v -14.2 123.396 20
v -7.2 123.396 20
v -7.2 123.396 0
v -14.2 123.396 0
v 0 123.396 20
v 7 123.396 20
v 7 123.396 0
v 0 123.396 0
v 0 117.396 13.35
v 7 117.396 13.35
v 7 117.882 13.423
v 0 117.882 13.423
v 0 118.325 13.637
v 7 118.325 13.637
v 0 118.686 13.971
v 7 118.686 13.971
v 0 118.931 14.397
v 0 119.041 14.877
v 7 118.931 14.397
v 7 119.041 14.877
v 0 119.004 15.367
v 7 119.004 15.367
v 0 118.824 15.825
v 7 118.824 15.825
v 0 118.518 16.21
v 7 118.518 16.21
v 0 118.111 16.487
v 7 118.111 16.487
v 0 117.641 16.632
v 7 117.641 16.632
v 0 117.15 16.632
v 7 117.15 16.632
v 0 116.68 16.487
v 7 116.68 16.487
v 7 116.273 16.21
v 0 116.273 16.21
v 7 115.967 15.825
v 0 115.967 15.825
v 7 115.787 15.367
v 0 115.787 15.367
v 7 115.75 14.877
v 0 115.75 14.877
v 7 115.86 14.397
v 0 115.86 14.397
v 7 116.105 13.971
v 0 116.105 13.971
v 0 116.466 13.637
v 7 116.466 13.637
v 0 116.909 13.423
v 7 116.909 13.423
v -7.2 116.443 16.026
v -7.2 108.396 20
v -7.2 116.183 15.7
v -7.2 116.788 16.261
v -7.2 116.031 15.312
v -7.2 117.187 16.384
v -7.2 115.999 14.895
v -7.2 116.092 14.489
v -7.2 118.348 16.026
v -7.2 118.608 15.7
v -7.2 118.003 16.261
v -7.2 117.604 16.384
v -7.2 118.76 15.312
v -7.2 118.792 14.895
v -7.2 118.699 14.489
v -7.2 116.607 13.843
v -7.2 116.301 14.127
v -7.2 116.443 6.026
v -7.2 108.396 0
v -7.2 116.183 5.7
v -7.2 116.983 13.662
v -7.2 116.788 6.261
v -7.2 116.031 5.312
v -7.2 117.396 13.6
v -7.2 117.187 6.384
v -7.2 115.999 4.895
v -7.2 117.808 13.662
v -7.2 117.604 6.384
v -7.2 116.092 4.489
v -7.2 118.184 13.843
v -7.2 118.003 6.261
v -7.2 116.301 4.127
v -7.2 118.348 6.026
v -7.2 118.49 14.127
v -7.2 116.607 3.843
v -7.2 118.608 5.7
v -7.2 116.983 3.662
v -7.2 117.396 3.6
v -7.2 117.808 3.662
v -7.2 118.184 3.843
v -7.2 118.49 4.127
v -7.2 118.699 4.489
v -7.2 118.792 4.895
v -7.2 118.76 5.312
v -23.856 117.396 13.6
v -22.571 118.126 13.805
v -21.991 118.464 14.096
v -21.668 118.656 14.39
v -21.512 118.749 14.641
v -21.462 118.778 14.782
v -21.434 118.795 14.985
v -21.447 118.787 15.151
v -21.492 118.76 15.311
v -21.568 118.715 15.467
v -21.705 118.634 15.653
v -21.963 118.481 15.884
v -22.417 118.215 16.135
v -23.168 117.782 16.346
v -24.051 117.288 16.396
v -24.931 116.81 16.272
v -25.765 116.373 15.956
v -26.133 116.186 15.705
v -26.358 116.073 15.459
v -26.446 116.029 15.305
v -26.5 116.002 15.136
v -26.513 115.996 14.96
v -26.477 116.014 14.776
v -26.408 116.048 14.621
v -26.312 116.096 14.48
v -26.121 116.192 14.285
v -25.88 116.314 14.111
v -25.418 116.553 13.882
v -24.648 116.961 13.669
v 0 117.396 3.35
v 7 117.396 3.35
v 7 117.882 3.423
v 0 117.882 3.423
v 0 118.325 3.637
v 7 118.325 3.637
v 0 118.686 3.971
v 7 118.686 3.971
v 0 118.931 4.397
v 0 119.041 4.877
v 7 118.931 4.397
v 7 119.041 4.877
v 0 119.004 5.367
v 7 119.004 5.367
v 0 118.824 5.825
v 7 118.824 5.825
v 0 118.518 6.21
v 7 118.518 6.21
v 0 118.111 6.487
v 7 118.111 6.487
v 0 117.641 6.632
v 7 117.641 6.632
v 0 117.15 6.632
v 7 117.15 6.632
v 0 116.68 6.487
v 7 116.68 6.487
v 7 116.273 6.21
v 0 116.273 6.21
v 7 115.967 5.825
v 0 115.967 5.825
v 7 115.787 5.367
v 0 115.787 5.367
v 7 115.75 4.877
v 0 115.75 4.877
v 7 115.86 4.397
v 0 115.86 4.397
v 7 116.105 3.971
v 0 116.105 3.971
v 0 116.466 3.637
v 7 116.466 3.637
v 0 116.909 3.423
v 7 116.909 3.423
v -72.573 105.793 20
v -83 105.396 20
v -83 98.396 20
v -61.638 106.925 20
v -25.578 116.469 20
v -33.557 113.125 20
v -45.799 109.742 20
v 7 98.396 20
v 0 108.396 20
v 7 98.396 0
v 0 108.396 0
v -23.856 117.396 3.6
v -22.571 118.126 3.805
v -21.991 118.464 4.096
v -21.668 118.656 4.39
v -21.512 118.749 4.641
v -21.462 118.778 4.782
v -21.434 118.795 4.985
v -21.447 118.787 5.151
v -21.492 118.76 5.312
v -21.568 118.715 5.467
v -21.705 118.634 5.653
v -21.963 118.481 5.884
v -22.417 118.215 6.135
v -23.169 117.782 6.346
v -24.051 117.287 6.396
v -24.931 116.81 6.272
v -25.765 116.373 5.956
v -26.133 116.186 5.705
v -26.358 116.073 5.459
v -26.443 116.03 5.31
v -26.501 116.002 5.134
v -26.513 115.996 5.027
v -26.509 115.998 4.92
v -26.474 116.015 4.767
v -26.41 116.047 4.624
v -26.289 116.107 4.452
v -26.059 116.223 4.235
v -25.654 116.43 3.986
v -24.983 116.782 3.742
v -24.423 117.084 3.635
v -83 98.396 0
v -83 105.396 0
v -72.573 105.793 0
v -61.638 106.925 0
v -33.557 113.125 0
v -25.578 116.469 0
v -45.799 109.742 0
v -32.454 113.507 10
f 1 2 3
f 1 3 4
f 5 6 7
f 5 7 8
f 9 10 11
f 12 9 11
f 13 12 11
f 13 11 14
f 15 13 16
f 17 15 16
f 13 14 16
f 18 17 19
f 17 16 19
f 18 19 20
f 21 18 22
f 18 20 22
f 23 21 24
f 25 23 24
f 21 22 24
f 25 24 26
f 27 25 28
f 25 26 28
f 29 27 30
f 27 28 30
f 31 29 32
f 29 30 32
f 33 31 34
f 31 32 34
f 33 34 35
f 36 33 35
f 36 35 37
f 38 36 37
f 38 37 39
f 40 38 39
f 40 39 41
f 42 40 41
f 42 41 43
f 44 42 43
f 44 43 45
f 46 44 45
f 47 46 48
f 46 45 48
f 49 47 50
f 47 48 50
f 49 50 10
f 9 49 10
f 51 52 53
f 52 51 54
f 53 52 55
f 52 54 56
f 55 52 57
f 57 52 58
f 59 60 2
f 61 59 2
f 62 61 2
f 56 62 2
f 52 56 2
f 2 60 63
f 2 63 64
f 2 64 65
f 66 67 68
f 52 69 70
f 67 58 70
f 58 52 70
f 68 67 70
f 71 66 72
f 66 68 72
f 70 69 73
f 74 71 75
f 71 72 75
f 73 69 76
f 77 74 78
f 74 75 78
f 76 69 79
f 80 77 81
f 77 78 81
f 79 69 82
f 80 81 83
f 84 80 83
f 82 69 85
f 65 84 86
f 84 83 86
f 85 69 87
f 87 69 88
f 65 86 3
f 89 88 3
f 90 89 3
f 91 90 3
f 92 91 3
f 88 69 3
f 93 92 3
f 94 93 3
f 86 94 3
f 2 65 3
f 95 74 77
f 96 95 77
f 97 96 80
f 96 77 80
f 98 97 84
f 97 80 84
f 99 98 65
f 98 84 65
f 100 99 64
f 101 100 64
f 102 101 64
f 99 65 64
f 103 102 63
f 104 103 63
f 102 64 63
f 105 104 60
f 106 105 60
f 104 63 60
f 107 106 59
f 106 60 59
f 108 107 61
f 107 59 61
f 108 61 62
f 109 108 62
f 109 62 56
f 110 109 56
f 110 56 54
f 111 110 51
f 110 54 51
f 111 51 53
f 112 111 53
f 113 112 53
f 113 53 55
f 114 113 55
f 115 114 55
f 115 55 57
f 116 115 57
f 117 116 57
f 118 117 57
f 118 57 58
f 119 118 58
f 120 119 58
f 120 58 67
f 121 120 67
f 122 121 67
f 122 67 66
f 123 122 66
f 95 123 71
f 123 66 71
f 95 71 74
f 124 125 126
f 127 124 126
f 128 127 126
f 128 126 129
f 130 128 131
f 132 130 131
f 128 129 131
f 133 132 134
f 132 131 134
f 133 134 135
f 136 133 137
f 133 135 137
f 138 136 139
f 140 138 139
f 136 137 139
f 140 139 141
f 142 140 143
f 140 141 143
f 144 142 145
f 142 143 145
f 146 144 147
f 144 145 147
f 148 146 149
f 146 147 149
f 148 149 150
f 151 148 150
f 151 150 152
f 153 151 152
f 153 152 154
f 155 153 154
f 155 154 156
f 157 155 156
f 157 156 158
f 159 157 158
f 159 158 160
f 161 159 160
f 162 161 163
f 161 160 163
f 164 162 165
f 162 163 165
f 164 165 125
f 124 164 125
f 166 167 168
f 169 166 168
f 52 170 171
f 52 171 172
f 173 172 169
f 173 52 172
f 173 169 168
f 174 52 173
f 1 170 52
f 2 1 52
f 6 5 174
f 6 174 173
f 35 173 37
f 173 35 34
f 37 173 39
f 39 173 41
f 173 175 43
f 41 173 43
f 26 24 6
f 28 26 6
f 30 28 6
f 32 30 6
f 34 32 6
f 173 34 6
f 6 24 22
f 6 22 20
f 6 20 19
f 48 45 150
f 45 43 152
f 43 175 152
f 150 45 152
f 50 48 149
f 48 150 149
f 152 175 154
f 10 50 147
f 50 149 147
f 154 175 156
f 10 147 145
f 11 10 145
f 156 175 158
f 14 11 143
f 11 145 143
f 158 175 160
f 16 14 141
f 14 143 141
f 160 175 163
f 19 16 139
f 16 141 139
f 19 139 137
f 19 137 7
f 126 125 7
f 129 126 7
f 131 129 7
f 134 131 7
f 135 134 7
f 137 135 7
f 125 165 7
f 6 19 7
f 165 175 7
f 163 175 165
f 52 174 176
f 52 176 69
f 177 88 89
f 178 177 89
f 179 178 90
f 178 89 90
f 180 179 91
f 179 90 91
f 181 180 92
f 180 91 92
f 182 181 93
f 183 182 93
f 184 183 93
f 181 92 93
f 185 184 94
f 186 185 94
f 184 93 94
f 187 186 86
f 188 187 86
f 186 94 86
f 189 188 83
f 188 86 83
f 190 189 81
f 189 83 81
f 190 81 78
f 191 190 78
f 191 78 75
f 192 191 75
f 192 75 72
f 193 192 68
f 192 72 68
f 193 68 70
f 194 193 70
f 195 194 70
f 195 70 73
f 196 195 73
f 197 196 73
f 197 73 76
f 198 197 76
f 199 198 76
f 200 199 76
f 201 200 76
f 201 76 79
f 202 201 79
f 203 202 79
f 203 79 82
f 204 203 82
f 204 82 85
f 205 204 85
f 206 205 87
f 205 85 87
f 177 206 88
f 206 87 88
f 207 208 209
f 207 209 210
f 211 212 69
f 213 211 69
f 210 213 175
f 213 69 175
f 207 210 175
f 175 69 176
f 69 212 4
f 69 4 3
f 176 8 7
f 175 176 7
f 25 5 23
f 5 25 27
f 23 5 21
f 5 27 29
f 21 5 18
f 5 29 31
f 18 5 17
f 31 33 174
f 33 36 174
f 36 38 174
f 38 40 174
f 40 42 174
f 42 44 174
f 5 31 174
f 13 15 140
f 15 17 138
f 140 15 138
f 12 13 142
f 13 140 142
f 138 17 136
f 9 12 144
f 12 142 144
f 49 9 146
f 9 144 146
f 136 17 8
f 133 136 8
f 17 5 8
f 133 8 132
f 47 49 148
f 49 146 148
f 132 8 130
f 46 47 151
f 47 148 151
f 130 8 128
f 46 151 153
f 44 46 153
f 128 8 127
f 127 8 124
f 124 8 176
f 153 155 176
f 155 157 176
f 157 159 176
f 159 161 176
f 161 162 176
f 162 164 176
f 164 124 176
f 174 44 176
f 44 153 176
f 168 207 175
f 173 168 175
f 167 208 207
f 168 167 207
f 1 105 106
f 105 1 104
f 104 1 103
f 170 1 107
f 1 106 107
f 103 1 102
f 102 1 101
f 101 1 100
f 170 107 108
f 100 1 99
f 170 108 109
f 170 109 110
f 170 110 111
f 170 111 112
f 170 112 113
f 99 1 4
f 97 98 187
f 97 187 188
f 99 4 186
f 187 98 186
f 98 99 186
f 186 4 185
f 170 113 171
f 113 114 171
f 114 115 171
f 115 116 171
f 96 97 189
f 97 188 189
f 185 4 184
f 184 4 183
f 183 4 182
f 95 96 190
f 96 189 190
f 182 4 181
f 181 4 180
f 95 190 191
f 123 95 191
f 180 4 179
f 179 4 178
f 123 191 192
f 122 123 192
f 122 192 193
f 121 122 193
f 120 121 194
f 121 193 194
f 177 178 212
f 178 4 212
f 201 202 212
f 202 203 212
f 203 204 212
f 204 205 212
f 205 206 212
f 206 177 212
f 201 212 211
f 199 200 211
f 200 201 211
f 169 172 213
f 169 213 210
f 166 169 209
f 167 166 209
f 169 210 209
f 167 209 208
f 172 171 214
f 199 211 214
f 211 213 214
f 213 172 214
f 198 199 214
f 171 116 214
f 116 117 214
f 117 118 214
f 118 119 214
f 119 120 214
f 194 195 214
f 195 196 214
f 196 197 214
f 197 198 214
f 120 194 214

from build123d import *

# Parameters (mm, degrees)
BOSS_EXTRUDE1_DEPTH = 20
SKETCH2_R           = 1.65
CUT_EXTRUDE1_DEPTH  = 7
SKETCH3_R           = 1.4
CUT_EXTRUDE2_DEPTH  = 27


with BuildPart() as part:
    # Sketch1 → Boss-Extrude1 (new body)
    with BuildSketch(Plane.XY):
        with BuildLine():
            Line((0, 123.395512055), (0, 108.395512055))
            Line((0, 108.395512055), (-7.2, 108.395512055))
            Line((-7.2, 108.395512055), (-7.2, 123.395512055))
            Line((-7.2, 123.395512055), (-14.2, 123.395512055))
            add(Edge.make_bspline(
                [(-14.2, 123.395512055), (-23.530576474, 117.205565192), (-38.446210931, 109.915945525), (-66.691471381, 105.395512055), (-83, 105.395512055)],
                knots=[0, 0, 0, 0, 0.267223526, 1, 1, 1, 1], degree=3))
            Line((-83, 105.395512055), (-83, 98.395512055))
            Line((-83, 98.395512055), (7, 98.395512055))
            Line((7, 98.395512055), (7, 123.395512055))
            Line((7, 123.395512055), (0, 123.395512055))
        make_face()
    extrude(amount=BOSS_EXTRUDE1_DEPTH)

    # Sketch2 → Cut-Extrude1 (cut)
    with BuildSketch(Plane(origin=(7, 0, 0), x_dir=(0, 0, -1), z_dir=(1, 0, 0))):
        with Locations((-15, 117.395512055)):
            Circle(SKETCH2_R)
        with Locations((-5, 117.395512055)):
            Circle(SKETCH2_R)
    extrude(amount=-CUT_EXTRUDE1_DEPTH, mode=Mode.SUBTRACT)

    # Sketch3 → Cut-Extrude2 (cut)
    with BuildSketch(Plane(origin=(-7.2, 0, 0), x_dir=(0, 0, -1), z_dir=(1, 0, 0))):
        with Locations((-15, 117.395512055)):
            Circle(SKETCH3_R)
        with Locations((-5, 117.395512055)):
            Circle(SKETCH3_R)
    extrude(amount=-CUT_EXTRUDE2_DEPTH, mode=Mode.SUBTRACT)


solid = part.part
